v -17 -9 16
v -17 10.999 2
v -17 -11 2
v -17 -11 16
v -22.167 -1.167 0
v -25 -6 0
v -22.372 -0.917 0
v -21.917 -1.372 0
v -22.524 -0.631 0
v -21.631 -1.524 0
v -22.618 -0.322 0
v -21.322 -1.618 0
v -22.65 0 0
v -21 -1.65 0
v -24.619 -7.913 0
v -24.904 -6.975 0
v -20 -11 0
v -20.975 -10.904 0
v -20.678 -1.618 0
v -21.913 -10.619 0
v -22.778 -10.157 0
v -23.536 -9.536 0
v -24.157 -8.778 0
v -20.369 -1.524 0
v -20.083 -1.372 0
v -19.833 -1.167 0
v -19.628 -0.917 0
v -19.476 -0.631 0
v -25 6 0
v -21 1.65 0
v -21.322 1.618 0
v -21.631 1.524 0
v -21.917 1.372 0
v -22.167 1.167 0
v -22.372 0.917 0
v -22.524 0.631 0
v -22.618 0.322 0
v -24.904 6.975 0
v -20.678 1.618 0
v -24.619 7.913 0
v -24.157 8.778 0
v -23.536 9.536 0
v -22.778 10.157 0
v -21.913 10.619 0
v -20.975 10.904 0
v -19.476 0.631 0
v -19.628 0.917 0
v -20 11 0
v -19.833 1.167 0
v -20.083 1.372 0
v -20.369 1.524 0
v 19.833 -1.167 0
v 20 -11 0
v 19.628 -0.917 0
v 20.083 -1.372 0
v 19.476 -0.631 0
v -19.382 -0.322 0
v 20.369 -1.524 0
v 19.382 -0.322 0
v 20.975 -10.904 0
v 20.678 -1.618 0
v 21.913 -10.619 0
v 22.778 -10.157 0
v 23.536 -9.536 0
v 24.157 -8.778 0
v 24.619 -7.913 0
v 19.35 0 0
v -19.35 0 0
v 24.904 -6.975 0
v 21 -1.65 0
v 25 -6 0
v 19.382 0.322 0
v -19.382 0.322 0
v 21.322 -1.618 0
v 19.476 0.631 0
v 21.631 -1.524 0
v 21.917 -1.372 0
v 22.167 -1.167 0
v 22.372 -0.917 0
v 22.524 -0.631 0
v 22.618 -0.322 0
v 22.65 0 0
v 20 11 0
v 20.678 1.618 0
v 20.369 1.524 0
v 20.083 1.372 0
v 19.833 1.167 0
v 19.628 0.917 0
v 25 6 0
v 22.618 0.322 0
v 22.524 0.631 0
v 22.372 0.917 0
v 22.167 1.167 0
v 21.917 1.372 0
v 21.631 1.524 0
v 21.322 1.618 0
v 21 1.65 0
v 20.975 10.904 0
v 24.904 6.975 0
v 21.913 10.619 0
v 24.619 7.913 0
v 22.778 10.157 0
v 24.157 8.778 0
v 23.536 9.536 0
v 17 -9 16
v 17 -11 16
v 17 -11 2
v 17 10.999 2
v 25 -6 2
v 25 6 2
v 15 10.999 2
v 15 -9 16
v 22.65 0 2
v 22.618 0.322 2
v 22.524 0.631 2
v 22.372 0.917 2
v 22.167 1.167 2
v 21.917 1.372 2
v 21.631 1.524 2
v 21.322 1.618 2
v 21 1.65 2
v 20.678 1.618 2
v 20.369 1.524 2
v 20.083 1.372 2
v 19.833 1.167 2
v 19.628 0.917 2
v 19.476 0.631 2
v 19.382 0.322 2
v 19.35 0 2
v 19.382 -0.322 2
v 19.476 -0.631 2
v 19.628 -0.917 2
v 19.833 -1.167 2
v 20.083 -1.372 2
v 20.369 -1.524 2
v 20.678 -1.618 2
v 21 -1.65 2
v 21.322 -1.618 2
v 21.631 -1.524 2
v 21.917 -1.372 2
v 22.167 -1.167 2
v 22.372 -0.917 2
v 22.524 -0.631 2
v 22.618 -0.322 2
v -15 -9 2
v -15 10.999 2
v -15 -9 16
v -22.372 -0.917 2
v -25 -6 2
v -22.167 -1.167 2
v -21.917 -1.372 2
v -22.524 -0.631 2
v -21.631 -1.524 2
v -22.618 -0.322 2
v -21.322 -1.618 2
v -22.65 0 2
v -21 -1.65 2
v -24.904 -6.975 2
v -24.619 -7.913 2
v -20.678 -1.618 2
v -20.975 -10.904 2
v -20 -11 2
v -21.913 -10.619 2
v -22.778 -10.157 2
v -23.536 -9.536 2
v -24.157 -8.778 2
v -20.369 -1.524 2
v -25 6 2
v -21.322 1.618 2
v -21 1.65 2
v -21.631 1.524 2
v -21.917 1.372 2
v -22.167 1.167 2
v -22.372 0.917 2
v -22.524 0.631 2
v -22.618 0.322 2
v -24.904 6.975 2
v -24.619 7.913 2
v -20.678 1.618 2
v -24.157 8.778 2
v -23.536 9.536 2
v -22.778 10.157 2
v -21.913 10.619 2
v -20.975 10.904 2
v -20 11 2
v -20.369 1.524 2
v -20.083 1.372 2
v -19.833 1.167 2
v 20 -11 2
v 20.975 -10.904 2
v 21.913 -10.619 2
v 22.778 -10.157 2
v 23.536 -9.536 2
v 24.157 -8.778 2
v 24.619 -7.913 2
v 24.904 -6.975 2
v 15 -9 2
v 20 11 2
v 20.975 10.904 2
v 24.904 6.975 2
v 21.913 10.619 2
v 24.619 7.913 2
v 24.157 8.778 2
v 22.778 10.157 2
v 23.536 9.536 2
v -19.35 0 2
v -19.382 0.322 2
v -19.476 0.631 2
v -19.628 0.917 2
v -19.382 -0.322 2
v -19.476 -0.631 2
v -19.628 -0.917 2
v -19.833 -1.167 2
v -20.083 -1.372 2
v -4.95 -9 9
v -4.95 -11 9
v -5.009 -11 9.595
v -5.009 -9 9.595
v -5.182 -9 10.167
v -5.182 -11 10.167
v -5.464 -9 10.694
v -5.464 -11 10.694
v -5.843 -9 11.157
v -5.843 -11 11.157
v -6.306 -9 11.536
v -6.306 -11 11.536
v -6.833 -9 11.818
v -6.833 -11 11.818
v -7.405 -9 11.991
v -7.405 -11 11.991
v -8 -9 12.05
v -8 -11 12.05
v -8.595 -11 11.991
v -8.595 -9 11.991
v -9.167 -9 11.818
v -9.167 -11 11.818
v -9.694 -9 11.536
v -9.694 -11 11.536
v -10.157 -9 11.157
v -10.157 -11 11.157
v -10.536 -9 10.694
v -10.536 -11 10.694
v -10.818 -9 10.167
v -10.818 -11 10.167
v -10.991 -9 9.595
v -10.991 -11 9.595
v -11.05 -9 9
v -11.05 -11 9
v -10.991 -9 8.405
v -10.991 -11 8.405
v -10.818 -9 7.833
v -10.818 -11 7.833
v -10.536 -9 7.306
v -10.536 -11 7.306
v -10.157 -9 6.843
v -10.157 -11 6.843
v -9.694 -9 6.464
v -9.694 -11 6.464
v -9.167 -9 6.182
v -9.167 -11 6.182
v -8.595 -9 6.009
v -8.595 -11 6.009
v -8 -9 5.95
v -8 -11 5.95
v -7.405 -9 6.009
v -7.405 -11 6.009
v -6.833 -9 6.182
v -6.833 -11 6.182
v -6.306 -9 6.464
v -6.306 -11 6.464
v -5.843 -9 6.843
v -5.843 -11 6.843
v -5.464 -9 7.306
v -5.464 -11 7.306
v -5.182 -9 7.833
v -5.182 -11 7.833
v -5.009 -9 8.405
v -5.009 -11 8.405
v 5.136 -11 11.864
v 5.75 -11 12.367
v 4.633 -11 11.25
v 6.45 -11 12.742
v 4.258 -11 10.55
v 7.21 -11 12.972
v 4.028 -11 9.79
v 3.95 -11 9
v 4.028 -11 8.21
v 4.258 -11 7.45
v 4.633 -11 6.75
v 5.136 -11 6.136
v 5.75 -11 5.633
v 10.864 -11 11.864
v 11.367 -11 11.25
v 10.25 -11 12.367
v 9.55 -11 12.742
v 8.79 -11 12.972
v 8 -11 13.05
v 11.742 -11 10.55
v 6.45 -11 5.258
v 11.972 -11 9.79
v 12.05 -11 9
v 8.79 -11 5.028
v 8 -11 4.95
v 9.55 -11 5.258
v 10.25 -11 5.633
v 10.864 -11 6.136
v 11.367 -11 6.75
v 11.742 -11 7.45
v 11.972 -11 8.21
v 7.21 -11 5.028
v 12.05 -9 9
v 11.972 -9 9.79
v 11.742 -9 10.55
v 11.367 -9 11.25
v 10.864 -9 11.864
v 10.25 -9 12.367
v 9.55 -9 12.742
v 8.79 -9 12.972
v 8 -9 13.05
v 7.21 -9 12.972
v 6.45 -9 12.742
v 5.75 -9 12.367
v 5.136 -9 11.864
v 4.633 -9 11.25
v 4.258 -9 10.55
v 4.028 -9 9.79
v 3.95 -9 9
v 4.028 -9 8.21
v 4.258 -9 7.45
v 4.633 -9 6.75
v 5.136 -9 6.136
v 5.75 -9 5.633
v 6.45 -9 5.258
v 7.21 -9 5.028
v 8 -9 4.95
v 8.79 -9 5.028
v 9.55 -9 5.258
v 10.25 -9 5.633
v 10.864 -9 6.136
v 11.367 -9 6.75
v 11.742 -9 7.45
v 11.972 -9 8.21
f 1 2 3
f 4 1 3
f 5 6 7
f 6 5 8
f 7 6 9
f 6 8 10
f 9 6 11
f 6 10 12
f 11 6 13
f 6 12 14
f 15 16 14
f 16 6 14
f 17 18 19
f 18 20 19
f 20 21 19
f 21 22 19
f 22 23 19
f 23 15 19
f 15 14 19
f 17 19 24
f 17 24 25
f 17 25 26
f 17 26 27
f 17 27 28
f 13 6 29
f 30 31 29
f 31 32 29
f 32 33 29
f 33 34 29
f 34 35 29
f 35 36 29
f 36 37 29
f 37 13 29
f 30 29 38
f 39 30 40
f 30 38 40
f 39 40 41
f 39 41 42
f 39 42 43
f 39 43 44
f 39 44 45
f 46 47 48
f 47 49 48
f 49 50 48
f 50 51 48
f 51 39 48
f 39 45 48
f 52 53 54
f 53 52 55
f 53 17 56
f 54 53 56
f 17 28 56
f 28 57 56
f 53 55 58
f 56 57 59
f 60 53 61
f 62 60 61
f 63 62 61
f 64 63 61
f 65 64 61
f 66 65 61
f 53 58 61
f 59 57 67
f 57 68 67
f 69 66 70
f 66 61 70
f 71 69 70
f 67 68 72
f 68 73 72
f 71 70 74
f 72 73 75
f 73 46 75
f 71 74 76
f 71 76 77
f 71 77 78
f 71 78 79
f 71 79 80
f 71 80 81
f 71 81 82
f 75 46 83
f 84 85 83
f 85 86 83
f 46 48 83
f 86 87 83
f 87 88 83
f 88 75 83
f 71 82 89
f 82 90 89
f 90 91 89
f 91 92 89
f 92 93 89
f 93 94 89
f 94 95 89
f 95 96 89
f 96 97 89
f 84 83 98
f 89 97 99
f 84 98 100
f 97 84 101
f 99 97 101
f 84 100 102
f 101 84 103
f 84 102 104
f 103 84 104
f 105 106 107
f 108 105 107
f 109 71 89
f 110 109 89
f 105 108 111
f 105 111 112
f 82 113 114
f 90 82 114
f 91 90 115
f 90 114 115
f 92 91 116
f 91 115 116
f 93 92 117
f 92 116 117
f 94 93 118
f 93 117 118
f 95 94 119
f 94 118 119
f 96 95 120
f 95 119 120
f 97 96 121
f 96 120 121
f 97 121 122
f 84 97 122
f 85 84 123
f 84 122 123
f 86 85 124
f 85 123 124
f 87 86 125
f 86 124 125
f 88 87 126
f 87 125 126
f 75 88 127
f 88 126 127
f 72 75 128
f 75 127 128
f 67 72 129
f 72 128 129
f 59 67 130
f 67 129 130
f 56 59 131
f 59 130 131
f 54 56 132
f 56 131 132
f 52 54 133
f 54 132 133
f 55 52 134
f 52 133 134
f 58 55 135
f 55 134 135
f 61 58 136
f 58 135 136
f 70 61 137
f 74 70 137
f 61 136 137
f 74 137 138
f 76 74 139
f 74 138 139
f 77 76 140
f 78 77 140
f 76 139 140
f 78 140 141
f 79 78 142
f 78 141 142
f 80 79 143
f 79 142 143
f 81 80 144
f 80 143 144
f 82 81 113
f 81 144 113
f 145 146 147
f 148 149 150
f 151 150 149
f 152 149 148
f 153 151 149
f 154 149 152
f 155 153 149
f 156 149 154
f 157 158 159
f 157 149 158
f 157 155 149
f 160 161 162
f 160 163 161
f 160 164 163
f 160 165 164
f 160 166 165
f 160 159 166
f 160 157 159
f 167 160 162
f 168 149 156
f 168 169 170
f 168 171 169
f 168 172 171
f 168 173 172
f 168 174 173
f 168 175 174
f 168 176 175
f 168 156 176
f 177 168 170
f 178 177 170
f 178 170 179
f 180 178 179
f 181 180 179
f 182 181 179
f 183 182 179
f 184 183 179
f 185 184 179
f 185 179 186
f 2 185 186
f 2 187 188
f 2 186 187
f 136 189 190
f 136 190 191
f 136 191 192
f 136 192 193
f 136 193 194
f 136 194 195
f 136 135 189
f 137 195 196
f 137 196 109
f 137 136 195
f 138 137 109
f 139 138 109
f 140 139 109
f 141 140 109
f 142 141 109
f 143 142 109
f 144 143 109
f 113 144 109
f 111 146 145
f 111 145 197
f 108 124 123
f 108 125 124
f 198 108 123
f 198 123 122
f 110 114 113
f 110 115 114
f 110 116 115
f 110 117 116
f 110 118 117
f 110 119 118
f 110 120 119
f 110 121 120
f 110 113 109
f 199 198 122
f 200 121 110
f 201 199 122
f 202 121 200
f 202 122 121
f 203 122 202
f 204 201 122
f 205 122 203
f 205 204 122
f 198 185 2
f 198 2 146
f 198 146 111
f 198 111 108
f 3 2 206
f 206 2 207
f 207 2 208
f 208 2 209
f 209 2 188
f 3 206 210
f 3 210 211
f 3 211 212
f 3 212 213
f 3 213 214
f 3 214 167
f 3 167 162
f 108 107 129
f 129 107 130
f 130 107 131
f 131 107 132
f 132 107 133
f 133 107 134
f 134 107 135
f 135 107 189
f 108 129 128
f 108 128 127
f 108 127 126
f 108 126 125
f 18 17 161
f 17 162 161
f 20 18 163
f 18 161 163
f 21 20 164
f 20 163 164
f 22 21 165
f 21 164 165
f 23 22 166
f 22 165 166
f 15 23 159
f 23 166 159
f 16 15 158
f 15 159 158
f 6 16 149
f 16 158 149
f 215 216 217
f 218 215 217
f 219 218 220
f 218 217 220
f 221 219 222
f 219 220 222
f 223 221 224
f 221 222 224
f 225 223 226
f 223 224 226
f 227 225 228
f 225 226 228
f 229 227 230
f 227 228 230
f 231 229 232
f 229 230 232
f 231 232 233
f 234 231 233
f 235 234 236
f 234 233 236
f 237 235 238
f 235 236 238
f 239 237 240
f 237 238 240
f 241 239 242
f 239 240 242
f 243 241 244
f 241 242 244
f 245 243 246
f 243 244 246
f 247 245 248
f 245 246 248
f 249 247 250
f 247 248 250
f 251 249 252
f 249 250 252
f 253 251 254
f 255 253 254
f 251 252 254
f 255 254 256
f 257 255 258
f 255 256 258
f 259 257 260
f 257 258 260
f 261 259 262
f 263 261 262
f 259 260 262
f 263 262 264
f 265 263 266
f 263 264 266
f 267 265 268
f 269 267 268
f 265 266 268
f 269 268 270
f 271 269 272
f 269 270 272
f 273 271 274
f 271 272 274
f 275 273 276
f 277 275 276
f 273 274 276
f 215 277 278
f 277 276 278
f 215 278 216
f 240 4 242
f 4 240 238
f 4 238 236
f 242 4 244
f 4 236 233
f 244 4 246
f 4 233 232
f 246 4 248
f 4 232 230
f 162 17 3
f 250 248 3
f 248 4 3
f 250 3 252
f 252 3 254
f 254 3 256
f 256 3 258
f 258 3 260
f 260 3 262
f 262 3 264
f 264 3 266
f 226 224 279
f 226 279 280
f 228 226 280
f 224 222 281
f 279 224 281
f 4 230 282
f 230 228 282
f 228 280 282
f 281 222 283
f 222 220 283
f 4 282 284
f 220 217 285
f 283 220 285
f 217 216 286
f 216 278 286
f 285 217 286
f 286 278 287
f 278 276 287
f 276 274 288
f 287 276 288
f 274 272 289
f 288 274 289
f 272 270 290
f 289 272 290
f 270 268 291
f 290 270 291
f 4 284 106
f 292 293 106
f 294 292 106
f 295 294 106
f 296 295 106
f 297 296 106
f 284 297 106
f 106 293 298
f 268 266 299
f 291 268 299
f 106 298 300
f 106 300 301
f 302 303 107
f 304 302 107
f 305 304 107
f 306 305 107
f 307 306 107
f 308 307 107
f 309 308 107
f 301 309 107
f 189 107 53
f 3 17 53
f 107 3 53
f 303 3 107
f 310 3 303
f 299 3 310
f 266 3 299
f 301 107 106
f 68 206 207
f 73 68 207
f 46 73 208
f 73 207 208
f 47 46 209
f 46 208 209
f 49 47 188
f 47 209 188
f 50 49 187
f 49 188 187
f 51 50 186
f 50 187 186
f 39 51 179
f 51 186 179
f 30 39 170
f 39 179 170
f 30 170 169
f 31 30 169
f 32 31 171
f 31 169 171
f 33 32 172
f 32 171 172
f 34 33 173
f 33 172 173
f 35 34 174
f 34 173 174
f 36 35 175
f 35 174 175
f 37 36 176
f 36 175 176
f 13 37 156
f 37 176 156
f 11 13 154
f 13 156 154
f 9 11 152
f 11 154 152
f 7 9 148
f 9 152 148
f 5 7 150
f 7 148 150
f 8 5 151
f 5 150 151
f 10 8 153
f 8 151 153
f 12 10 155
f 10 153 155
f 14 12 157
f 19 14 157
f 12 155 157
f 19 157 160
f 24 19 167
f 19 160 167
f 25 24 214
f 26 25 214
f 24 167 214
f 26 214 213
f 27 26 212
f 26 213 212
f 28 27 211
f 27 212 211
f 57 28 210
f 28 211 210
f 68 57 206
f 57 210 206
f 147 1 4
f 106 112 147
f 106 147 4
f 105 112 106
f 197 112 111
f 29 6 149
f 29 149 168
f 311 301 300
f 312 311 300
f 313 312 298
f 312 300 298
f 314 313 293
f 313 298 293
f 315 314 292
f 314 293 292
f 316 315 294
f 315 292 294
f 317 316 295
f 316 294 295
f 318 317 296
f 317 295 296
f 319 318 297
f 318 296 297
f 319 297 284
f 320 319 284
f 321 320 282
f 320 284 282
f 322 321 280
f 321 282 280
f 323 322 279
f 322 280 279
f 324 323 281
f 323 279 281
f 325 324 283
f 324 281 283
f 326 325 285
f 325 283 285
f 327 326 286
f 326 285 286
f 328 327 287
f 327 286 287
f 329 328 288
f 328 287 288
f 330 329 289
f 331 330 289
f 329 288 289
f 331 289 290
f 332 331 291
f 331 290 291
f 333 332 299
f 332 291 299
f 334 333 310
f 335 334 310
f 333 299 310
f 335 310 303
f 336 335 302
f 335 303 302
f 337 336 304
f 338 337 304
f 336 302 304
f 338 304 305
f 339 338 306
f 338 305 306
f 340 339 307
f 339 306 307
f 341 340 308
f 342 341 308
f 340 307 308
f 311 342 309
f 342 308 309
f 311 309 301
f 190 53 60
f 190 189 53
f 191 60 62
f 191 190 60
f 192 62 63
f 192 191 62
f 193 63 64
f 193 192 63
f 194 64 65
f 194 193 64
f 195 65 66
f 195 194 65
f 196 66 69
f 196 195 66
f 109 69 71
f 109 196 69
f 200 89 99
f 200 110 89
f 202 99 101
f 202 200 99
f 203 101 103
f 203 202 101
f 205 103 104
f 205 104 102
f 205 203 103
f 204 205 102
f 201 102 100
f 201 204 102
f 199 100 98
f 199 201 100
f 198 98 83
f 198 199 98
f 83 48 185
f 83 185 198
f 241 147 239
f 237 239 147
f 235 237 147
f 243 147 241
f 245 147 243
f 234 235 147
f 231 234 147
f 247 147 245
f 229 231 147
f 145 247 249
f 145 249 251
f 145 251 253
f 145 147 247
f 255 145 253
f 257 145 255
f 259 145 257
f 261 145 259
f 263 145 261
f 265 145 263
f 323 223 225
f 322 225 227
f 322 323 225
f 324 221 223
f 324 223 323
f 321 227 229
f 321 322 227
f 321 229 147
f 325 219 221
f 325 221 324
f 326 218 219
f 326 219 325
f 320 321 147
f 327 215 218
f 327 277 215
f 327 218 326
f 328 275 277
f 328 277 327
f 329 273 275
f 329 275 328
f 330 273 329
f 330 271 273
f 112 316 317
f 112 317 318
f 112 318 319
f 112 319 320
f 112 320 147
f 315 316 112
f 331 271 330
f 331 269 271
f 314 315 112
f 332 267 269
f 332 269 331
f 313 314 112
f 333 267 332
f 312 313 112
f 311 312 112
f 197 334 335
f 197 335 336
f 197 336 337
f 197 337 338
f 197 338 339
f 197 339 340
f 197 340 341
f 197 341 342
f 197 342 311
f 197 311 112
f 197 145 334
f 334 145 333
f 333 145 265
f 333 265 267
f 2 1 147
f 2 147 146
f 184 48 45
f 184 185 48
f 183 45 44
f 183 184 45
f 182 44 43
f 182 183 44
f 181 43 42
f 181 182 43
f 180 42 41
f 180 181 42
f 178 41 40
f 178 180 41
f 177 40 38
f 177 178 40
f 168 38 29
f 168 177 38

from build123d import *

# Parameters (mm, degrees)
F0_W      = 50
F0_H      = 22
F1_DEPTH  = 2
F2_W      = 34
F2_H      = 2
F3_DEPTH  = 14
F4_R      = 3.05
F4_R_2    = 4.05
F5_DEPTH  = 2
F6_R      = 1.65
F7_DEPTH  = 2
F9_DEPTH  = 2
F11_DEPTH = 2
F12_R     = 5
F13_R     = 5


with BuildPart() as f1:
    # F0 (on Top) → F1 (new body)
    with BuildSketch(Plane.XY):
        Rectangle(F0_W, F0_H)
    extrude(amount=F1_DEPTH)

    # F2 (on face) → F3 (join)
    with BuildSketch(Plane.XY.offset(2)):
        with Locations((0, -10)):
            Rectangle(F2_W, F2_H)
    extrude(amount=F3_DEPTH)

    # F4 (on face) → F5 (cut)
    with BuildSketch(Plane.XZ.offset(11)):
        with Locations((-8, 9)):
            Circle(F4_R)
        with Locations((8, 9)):
            Circle(F4_R_2)
    extrude(amount=-F5_DEPTH, mode=Mode.SUBTRACT)

    # F6 (on face) → F7 (cut)
    with BuildSketch(Plane.XY.offset(2)):
        with Locations((-21, 0)):
            Circle(F6_R)
        with Locations((21, 0)):
            Circle(F6_R)
    extrude(amount=-F7_DEPTH, mode=Mode.SUBTRACT)

    # F8 (on face) → F9 (join)
    with BuildSketch(Plane.YZ.offset(17)):
        Polygon((10.999476, 1.999592), (-9, 16), (-9, 2), align=None)
    extrude(amount=-F9_DEPTH)

    # F10 (on face) → F11 (join)
    with BuildSketch(Plane(origin=(-17, 0, 0), x_dir=(0, -1, 0), z_dir=(-1, 0, 0))):
        Polygon((9, 2), (9, 16), (-10.999475, 1.999864), align=None)
    extrude(amount=-F11_DEPTH)

    # F12
    f12_edges = [f1.edges().sort_by_distance(p)[0] for p in [
        (-25, 11, 1),
        (-25, -11, 1),
    ]]
    fillet(f12_edges, radius=F12_R)

    # F13
    f13_edges = [f1.edges().sort_by_distance(p)[0] for p in [
        (25, -11, 1),
        (25, 11, 1),
    ]]
    fillet(f13_edges, radius=F13_R)


solid = f1.part
